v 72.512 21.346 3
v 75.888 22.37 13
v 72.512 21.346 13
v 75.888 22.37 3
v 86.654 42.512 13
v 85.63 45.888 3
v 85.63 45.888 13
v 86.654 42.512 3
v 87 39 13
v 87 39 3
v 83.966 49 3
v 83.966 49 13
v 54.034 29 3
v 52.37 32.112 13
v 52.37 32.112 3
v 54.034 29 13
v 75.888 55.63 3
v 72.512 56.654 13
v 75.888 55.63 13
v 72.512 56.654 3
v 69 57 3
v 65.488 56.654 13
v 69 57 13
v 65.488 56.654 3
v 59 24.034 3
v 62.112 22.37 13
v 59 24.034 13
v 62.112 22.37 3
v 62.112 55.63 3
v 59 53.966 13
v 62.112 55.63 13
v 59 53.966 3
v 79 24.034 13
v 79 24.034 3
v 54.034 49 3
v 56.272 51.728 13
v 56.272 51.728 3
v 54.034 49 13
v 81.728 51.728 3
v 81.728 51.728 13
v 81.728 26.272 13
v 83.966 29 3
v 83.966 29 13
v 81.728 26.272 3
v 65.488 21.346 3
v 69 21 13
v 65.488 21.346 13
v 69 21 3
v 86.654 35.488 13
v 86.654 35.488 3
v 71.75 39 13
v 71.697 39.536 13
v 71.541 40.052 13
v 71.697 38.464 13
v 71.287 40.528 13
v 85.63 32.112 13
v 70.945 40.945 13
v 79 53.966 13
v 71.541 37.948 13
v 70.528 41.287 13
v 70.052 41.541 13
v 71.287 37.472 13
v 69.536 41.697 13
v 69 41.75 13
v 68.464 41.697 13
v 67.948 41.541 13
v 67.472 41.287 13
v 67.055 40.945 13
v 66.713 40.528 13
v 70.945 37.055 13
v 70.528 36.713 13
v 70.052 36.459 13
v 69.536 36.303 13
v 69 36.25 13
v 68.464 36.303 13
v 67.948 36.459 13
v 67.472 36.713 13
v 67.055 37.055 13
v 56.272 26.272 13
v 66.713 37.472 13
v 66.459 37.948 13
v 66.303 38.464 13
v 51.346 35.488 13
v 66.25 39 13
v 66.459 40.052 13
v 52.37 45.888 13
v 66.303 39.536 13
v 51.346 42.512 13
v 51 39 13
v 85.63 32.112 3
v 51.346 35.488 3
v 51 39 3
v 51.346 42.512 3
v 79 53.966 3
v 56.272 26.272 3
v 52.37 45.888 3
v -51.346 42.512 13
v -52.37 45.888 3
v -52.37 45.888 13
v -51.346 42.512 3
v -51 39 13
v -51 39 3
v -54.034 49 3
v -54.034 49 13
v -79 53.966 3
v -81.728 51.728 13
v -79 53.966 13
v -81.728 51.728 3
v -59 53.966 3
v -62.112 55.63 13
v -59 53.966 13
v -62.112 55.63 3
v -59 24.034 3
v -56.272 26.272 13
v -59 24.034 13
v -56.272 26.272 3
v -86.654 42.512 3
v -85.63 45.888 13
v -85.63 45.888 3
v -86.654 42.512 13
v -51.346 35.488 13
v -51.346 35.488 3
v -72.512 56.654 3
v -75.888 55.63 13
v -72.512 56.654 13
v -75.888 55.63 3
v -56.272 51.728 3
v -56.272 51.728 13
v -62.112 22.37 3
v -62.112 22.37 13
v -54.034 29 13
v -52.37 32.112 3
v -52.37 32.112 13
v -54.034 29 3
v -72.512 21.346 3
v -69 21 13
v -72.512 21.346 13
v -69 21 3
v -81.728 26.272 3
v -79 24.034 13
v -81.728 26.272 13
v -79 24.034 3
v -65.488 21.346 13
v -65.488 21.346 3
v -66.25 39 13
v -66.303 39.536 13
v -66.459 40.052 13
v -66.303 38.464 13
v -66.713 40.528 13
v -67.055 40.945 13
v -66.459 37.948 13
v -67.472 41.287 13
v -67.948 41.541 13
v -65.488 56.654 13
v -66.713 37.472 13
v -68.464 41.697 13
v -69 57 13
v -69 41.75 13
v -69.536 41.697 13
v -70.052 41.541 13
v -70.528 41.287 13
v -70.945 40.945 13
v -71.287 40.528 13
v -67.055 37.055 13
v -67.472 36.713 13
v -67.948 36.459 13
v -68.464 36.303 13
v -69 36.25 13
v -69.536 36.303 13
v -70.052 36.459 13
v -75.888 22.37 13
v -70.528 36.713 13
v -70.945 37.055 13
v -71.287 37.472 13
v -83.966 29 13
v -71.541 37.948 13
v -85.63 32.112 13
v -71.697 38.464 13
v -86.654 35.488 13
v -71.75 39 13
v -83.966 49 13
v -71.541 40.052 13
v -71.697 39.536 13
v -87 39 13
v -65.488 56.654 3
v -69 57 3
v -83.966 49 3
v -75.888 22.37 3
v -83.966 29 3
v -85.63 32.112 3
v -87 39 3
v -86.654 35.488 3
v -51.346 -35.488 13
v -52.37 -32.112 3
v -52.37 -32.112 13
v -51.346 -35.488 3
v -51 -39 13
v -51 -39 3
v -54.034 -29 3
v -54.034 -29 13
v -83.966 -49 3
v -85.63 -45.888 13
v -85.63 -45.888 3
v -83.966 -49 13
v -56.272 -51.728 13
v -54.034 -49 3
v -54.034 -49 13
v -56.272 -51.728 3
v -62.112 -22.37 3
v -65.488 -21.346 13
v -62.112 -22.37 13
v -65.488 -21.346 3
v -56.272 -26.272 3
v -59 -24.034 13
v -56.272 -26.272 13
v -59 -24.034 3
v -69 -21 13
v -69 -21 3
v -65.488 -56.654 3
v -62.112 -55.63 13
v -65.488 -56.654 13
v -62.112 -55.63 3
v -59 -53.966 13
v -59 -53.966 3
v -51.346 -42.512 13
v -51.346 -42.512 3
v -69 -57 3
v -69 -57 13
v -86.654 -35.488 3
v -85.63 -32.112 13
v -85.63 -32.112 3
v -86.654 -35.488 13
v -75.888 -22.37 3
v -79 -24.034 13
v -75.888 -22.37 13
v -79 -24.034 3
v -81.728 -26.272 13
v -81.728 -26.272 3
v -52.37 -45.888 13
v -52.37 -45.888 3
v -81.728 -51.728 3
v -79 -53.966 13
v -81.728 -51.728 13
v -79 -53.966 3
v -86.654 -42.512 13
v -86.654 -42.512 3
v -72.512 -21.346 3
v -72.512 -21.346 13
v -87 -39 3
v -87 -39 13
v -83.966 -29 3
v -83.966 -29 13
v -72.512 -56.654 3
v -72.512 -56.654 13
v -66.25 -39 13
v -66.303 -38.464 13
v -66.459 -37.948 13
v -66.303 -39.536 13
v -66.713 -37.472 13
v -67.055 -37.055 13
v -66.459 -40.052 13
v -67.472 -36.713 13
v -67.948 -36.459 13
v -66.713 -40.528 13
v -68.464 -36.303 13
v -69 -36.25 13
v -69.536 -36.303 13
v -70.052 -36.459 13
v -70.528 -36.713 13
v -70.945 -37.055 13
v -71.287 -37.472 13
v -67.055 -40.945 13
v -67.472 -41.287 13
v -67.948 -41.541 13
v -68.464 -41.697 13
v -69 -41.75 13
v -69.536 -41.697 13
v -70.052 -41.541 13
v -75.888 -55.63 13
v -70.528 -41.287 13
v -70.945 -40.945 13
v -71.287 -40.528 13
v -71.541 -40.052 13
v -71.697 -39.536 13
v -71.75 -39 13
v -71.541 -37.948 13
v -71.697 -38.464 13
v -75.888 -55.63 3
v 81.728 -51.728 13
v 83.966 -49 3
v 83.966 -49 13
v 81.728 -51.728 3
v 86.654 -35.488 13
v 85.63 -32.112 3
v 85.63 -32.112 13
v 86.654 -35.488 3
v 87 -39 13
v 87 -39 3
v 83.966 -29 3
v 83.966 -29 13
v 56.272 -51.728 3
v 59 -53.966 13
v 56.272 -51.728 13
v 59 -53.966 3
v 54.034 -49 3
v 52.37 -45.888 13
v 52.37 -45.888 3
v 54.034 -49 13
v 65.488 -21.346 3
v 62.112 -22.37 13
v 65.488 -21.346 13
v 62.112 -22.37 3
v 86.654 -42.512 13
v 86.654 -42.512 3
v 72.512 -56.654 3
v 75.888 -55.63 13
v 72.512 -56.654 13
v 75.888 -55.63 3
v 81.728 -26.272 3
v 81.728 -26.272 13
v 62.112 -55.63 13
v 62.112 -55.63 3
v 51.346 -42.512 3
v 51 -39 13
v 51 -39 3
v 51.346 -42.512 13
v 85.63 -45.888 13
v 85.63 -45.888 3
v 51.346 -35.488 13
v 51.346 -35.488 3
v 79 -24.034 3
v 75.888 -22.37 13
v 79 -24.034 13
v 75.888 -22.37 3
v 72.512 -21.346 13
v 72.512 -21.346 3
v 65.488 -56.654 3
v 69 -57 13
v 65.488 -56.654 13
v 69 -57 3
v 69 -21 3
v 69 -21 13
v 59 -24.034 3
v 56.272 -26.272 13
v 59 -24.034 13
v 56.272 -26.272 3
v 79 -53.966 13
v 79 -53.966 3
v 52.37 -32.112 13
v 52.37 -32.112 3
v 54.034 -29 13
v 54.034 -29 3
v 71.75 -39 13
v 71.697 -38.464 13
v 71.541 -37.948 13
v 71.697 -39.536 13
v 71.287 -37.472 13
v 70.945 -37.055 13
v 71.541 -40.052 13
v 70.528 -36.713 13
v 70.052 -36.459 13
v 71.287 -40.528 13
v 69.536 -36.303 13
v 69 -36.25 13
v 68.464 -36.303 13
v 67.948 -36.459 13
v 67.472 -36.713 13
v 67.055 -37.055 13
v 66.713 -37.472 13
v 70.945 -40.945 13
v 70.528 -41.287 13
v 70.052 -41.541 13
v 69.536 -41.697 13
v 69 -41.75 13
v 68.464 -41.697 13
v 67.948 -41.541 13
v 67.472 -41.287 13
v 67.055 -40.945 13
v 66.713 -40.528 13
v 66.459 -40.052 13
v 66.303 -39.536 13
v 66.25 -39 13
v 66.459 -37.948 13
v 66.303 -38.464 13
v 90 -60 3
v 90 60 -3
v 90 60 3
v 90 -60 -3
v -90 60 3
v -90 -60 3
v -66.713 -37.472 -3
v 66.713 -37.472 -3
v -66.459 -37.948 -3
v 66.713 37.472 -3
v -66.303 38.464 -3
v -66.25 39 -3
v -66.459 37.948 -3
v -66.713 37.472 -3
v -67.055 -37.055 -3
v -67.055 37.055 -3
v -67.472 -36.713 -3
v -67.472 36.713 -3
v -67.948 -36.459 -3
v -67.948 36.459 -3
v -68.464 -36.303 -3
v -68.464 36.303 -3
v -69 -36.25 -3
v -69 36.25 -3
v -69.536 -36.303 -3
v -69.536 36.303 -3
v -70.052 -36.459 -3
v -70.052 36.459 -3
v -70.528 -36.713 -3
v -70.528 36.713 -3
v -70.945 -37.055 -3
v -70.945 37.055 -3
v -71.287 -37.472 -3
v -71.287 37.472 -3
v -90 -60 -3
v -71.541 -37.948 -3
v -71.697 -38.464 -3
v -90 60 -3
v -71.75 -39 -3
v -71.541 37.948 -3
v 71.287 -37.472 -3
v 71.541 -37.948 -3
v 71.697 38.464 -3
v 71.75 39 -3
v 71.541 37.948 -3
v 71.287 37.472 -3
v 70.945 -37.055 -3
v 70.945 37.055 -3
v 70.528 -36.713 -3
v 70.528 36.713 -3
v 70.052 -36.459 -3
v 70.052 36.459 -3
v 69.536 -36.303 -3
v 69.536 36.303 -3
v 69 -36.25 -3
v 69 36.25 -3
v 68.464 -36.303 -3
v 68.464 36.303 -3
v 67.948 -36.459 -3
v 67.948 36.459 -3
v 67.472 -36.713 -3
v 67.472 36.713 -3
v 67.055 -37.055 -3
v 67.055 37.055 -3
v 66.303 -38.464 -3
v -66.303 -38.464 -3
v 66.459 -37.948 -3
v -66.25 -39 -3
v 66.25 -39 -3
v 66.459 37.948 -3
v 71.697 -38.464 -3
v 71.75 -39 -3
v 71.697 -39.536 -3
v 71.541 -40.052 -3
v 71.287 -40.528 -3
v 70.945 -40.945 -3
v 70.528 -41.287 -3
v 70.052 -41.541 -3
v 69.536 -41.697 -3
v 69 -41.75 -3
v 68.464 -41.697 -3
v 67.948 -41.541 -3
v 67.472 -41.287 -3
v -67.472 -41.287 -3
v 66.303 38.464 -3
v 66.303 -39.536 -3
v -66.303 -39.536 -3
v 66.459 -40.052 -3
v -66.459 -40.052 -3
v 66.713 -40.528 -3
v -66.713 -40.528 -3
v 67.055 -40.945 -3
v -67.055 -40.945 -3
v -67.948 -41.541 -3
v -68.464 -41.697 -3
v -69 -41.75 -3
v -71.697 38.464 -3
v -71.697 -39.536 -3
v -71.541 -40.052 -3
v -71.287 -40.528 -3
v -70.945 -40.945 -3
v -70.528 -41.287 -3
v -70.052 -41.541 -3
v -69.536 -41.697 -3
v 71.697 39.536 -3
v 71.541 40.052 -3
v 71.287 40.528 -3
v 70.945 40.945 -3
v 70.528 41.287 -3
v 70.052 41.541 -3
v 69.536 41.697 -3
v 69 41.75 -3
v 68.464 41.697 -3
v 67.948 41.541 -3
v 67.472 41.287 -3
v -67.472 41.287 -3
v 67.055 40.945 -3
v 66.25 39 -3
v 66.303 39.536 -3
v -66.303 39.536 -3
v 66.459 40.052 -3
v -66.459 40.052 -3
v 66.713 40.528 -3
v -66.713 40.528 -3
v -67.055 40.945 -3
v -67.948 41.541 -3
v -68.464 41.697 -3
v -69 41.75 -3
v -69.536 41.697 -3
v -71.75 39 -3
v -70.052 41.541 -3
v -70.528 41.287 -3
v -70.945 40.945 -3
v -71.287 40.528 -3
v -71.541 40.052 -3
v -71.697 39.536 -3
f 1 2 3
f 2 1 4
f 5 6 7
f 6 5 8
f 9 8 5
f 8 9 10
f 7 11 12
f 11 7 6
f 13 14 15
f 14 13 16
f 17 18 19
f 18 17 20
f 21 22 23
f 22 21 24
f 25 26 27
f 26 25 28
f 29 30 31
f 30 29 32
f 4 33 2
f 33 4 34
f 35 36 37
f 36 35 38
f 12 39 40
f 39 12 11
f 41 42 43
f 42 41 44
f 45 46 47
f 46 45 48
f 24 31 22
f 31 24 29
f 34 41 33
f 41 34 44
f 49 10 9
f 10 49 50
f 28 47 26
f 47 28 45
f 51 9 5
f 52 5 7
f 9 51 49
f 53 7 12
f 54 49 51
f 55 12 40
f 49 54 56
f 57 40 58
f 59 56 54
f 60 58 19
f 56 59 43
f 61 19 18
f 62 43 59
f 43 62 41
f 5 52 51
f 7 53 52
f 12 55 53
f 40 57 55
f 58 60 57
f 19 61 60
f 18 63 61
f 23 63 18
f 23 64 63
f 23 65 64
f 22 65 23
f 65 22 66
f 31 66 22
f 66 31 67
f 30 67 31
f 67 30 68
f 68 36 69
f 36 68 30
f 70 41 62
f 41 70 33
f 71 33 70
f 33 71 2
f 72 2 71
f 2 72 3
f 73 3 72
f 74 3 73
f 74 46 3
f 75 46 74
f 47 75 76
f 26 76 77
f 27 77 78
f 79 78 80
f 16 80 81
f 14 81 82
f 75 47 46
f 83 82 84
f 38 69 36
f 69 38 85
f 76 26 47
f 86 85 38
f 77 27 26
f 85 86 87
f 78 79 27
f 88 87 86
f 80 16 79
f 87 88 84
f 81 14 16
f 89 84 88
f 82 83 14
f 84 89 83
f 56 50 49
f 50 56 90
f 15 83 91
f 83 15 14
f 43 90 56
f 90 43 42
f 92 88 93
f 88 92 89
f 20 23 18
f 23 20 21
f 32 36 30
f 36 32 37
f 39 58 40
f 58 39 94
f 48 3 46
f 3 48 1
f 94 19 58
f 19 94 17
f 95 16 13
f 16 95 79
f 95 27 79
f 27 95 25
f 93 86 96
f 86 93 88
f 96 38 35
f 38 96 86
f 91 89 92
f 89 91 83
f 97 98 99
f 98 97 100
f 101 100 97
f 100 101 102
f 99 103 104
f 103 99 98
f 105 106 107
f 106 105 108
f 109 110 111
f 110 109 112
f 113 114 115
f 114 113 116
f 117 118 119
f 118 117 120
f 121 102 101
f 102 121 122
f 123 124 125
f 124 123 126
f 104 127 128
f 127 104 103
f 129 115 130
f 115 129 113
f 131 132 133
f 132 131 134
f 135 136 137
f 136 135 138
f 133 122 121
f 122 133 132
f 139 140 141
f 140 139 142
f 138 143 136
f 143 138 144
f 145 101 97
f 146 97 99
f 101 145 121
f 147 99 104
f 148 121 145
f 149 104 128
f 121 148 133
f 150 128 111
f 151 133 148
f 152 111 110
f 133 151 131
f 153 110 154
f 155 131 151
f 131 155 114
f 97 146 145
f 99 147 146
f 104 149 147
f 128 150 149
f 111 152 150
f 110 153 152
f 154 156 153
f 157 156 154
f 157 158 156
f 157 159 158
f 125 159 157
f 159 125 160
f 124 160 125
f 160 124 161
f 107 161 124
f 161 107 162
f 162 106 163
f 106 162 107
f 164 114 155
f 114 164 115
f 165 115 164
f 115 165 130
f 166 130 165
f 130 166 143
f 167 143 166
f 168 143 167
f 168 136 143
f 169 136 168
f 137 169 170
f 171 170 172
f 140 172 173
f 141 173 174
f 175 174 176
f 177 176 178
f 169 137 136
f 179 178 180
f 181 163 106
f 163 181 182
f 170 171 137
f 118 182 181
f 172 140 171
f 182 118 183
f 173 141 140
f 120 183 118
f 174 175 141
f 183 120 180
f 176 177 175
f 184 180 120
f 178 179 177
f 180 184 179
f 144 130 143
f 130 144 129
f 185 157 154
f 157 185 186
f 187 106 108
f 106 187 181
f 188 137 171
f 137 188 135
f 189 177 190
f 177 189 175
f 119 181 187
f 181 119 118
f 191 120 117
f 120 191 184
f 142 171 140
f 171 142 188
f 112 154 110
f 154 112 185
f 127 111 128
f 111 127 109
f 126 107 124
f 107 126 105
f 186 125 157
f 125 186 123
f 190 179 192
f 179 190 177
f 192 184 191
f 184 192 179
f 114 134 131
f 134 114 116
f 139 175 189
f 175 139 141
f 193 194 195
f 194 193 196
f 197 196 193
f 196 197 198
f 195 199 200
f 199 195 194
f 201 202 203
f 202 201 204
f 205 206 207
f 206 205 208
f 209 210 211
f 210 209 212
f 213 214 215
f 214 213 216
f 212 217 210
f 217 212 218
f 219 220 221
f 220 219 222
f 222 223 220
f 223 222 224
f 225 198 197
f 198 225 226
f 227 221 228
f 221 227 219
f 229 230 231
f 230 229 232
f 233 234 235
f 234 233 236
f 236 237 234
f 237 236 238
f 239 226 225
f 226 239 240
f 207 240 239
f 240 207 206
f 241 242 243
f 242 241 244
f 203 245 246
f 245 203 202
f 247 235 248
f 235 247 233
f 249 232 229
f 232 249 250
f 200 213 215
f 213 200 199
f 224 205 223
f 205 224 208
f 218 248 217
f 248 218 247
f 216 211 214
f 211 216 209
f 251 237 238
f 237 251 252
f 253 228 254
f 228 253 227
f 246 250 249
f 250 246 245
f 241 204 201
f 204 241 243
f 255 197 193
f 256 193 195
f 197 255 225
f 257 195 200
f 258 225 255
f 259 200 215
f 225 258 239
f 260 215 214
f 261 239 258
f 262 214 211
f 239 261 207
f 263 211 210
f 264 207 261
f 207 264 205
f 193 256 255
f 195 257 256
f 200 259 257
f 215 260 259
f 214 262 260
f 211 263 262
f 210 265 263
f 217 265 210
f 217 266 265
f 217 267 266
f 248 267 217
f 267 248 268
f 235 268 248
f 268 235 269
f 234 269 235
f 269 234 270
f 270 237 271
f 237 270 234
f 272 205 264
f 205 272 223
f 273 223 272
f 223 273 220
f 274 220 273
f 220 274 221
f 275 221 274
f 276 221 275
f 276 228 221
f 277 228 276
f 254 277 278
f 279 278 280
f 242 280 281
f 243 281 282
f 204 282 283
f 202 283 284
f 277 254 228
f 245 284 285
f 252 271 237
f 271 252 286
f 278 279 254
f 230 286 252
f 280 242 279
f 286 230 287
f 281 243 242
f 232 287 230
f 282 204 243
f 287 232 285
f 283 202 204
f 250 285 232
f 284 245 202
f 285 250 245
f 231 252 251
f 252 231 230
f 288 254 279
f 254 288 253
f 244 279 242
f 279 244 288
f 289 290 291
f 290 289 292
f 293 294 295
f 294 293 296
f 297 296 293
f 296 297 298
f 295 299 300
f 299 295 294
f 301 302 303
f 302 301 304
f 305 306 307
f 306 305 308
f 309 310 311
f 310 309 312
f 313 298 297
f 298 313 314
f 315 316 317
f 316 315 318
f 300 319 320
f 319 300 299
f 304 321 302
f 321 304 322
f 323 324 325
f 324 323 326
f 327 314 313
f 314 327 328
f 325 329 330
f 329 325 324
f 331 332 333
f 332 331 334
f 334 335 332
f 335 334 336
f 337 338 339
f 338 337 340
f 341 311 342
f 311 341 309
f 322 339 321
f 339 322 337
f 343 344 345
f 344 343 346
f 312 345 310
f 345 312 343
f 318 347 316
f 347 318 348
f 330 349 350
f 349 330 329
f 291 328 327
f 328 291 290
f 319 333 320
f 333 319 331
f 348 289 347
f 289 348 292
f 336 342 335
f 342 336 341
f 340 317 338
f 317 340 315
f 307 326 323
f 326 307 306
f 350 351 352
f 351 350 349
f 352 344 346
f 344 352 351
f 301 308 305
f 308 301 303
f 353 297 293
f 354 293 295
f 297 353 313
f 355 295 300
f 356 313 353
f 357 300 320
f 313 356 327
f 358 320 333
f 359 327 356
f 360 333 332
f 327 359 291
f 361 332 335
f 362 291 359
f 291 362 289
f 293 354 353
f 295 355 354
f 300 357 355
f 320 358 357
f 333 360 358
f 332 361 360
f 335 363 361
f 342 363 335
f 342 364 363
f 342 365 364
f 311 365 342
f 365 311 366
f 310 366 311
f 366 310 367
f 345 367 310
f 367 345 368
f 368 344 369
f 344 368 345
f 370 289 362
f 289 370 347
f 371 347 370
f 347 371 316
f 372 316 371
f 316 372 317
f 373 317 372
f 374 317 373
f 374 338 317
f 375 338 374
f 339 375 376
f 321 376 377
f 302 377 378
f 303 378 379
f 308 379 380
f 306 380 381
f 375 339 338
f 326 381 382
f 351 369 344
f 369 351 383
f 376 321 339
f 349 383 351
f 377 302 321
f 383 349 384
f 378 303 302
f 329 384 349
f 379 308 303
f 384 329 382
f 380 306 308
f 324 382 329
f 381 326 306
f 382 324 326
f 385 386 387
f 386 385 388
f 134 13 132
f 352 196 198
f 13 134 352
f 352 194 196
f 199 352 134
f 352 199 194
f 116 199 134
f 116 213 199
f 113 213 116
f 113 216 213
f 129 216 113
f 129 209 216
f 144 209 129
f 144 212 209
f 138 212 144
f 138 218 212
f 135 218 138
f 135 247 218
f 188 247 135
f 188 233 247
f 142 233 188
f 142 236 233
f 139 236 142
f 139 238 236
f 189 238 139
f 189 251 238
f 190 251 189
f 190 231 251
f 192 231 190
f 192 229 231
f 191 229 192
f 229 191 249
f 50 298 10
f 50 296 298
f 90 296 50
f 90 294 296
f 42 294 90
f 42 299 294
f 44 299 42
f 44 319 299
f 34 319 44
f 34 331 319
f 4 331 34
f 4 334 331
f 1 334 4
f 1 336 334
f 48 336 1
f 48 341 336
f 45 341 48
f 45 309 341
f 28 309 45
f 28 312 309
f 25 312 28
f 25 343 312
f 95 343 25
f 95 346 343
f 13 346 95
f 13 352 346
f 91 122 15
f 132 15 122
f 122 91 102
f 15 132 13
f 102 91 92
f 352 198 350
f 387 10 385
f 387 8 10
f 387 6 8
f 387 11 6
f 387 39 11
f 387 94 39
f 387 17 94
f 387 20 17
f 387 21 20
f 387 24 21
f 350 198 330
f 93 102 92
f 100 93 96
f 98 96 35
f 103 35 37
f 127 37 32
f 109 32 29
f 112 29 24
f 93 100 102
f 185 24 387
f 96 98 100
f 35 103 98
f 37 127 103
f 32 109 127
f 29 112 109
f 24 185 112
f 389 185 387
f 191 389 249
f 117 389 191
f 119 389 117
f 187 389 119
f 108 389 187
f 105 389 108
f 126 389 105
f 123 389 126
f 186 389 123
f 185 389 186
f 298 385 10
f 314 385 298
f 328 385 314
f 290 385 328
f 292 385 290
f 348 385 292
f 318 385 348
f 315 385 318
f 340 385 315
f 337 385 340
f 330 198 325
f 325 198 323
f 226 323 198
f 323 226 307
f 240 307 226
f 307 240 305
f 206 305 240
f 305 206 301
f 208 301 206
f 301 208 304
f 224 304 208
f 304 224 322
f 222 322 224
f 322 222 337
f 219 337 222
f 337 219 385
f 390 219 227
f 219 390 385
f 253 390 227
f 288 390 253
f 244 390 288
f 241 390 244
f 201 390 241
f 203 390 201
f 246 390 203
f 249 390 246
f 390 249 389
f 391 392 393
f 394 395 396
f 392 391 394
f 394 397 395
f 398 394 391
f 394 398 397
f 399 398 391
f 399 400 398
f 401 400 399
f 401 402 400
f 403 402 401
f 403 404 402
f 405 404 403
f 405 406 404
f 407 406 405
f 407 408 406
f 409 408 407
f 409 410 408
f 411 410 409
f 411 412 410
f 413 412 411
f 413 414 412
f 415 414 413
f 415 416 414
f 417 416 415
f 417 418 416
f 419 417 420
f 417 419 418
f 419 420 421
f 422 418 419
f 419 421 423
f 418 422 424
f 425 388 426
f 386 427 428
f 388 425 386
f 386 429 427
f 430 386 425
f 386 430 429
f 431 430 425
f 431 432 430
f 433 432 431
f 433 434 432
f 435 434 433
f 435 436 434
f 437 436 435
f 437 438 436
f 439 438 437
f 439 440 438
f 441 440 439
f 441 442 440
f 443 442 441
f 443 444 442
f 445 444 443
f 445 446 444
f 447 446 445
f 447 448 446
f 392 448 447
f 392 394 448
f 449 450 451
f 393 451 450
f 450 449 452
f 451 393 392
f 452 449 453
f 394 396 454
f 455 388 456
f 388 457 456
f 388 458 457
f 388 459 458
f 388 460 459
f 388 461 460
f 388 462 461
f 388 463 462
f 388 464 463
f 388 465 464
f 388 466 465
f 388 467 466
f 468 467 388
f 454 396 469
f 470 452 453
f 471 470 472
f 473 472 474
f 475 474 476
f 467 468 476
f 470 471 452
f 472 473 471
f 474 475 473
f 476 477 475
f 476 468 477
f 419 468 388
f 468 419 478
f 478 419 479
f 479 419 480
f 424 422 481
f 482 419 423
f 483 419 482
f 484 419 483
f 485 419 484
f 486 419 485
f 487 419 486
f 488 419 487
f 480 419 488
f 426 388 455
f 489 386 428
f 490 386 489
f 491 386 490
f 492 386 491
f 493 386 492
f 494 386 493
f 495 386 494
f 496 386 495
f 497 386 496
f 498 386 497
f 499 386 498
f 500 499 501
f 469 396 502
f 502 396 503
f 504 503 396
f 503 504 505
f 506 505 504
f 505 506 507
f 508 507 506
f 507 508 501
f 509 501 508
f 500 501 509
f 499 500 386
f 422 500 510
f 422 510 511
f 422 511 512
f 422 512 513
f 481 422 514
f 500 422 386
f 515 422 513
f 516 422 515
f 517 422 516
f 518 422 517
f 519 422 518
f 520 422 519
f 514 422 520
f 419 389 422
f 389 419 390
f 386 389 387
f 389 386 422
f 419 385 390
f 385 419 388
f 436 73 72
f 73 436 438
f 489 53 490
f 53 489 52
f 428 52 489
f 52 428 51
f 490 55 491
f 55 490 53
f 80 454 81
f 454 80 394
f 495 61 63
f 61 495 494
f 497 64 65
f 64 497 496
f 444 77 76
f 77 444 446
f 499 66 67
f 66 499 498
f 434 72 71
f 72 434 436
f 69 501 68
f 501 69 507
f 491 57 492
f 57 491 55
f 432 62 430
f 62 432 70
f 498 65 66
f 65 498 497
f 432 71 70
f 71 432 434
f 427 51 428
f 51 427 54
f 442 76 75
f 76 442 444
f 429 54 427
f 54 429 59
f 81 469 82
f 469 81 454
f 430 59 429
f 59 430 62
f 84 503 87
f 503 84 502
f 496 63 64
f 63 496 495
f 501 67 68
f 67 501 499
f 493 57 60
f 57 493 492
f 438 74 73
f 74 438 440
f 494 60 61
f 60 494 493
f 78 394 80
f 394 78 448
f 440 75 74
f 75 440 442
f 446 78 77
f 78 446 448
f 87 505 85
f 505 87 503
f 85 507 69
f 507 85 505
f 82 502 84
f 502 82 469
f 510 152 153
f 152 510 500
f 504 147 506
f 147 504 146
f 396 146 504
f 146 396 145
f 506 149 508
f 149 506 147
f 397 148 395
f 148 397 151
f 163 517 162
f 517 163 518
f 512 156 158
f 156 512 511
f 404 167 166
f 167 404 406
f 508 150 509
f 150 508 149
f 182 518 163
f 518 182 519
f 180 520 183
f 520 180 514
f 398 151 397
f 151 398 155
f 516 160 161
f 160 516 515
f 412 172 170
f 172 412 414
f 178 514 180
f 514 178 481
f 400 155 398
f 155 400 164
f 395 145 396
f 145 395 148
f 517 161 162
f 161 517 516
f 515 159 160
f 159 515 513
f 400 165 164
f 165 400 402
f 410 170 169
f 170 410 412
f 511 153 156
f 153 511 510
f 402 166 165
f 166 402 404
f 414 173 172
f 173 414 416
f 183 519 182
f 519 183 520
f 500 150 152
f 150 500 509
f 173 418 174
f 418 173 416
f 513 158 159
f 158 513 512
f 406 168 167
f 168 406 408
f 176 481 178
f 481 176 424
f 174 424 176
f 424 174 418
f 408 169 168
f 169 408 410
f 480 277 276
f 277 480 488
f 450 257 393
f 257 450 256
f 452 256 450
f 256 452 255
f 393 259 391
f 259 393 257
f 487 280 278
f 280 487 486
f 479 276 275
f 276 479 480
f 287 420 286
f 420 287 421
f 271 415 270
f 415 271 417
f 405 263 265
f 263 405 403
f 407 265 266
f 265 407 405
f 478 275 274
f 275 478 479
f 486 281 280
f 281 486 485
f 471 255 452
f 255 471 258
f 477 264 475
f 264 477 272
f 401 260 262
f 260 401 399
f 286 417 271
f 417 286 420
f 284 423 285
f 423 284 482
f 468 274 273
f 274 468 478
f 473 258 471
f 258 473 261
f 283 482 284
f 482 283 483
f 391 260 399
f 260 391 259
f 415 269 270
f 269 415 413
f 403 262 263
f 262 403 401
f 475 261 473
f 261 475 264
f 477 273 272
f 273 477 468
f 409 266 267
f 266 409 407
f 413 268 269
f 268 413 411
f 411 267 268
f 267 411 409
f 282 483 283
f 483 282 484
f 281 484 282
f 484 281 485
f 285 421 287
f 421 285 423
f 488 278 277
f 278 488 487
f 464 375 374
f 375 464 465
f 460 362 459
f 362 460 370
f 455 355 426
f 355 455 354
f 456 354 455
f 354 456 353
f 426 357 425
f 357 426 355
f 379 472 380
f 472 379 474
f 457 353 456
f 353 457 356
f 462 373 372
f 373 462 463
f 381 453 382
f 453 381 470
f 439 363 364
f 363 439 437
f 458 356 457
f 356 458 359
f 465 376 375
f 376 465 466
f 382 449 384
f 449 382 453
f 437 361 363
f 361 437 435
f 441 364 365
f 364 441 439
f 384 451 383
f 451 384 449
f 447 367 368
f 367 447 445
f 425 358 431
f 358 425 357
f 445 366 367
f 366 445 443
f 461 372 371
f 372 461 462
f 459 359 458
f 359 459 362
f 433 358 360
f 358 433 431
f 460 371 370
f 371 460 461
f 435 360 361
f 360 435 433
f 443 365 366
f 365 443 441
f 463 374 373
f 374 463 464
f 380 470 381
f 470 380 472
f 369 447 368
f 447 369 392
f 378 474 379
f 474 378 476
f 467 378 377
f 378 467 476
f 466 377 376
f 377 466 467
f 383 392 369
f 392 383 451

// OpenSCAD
$fn = 32;

// ----------------------------------------------------------------------
// Anchor pads 180 x 120 x 16
// four corner bosses with anchor holes
// ----------------------------------------------------------------------

// --- parameters (mm) ---
plate = [180, 120, 6];  // base plate size (x, y, z)
pads = 4;               // boss count, one per corner
edge = 21;              // boss centre offset from the plate edge
boss_d = 36;            // boss diameter
boss_h = 10;            // boss height above the base plate
hole_d = 5.5;           // hole diameter

// --- derived feature positions (mm) ---
height = plate[2] + boss_h;      // = 16   overall height of the part
corner_x = plate[0] / 2 - edge;  // = 69   boss centre X
corner_y = plate[1] / 2 - edge;  // = 39   boss centre Y
feature_centers = [
  [corner_x, corner_y],
  [-corner_x, corner_y],
  [-corner_x, -corner_y],
  [corner_x, -corner_y]
];   // boss centres, anchor holes are drilled there

// base plate, four bosses standing on it, anchor holes all the way through
difference() {
  union() {
    cube(plate, center = true);
    for (centre = feature_centers)
      translate([centre[0], centre[1], plate[2] / 2 - 1])
        cylinder(d = boss_d, h = boss_h + 1);
  }
  for (centre = feature_centers)
    translate([centre[0], centre[1], -height])
      cylinder(d = hole_d, h = 2 * height + 2);  // through boss and plate
}
